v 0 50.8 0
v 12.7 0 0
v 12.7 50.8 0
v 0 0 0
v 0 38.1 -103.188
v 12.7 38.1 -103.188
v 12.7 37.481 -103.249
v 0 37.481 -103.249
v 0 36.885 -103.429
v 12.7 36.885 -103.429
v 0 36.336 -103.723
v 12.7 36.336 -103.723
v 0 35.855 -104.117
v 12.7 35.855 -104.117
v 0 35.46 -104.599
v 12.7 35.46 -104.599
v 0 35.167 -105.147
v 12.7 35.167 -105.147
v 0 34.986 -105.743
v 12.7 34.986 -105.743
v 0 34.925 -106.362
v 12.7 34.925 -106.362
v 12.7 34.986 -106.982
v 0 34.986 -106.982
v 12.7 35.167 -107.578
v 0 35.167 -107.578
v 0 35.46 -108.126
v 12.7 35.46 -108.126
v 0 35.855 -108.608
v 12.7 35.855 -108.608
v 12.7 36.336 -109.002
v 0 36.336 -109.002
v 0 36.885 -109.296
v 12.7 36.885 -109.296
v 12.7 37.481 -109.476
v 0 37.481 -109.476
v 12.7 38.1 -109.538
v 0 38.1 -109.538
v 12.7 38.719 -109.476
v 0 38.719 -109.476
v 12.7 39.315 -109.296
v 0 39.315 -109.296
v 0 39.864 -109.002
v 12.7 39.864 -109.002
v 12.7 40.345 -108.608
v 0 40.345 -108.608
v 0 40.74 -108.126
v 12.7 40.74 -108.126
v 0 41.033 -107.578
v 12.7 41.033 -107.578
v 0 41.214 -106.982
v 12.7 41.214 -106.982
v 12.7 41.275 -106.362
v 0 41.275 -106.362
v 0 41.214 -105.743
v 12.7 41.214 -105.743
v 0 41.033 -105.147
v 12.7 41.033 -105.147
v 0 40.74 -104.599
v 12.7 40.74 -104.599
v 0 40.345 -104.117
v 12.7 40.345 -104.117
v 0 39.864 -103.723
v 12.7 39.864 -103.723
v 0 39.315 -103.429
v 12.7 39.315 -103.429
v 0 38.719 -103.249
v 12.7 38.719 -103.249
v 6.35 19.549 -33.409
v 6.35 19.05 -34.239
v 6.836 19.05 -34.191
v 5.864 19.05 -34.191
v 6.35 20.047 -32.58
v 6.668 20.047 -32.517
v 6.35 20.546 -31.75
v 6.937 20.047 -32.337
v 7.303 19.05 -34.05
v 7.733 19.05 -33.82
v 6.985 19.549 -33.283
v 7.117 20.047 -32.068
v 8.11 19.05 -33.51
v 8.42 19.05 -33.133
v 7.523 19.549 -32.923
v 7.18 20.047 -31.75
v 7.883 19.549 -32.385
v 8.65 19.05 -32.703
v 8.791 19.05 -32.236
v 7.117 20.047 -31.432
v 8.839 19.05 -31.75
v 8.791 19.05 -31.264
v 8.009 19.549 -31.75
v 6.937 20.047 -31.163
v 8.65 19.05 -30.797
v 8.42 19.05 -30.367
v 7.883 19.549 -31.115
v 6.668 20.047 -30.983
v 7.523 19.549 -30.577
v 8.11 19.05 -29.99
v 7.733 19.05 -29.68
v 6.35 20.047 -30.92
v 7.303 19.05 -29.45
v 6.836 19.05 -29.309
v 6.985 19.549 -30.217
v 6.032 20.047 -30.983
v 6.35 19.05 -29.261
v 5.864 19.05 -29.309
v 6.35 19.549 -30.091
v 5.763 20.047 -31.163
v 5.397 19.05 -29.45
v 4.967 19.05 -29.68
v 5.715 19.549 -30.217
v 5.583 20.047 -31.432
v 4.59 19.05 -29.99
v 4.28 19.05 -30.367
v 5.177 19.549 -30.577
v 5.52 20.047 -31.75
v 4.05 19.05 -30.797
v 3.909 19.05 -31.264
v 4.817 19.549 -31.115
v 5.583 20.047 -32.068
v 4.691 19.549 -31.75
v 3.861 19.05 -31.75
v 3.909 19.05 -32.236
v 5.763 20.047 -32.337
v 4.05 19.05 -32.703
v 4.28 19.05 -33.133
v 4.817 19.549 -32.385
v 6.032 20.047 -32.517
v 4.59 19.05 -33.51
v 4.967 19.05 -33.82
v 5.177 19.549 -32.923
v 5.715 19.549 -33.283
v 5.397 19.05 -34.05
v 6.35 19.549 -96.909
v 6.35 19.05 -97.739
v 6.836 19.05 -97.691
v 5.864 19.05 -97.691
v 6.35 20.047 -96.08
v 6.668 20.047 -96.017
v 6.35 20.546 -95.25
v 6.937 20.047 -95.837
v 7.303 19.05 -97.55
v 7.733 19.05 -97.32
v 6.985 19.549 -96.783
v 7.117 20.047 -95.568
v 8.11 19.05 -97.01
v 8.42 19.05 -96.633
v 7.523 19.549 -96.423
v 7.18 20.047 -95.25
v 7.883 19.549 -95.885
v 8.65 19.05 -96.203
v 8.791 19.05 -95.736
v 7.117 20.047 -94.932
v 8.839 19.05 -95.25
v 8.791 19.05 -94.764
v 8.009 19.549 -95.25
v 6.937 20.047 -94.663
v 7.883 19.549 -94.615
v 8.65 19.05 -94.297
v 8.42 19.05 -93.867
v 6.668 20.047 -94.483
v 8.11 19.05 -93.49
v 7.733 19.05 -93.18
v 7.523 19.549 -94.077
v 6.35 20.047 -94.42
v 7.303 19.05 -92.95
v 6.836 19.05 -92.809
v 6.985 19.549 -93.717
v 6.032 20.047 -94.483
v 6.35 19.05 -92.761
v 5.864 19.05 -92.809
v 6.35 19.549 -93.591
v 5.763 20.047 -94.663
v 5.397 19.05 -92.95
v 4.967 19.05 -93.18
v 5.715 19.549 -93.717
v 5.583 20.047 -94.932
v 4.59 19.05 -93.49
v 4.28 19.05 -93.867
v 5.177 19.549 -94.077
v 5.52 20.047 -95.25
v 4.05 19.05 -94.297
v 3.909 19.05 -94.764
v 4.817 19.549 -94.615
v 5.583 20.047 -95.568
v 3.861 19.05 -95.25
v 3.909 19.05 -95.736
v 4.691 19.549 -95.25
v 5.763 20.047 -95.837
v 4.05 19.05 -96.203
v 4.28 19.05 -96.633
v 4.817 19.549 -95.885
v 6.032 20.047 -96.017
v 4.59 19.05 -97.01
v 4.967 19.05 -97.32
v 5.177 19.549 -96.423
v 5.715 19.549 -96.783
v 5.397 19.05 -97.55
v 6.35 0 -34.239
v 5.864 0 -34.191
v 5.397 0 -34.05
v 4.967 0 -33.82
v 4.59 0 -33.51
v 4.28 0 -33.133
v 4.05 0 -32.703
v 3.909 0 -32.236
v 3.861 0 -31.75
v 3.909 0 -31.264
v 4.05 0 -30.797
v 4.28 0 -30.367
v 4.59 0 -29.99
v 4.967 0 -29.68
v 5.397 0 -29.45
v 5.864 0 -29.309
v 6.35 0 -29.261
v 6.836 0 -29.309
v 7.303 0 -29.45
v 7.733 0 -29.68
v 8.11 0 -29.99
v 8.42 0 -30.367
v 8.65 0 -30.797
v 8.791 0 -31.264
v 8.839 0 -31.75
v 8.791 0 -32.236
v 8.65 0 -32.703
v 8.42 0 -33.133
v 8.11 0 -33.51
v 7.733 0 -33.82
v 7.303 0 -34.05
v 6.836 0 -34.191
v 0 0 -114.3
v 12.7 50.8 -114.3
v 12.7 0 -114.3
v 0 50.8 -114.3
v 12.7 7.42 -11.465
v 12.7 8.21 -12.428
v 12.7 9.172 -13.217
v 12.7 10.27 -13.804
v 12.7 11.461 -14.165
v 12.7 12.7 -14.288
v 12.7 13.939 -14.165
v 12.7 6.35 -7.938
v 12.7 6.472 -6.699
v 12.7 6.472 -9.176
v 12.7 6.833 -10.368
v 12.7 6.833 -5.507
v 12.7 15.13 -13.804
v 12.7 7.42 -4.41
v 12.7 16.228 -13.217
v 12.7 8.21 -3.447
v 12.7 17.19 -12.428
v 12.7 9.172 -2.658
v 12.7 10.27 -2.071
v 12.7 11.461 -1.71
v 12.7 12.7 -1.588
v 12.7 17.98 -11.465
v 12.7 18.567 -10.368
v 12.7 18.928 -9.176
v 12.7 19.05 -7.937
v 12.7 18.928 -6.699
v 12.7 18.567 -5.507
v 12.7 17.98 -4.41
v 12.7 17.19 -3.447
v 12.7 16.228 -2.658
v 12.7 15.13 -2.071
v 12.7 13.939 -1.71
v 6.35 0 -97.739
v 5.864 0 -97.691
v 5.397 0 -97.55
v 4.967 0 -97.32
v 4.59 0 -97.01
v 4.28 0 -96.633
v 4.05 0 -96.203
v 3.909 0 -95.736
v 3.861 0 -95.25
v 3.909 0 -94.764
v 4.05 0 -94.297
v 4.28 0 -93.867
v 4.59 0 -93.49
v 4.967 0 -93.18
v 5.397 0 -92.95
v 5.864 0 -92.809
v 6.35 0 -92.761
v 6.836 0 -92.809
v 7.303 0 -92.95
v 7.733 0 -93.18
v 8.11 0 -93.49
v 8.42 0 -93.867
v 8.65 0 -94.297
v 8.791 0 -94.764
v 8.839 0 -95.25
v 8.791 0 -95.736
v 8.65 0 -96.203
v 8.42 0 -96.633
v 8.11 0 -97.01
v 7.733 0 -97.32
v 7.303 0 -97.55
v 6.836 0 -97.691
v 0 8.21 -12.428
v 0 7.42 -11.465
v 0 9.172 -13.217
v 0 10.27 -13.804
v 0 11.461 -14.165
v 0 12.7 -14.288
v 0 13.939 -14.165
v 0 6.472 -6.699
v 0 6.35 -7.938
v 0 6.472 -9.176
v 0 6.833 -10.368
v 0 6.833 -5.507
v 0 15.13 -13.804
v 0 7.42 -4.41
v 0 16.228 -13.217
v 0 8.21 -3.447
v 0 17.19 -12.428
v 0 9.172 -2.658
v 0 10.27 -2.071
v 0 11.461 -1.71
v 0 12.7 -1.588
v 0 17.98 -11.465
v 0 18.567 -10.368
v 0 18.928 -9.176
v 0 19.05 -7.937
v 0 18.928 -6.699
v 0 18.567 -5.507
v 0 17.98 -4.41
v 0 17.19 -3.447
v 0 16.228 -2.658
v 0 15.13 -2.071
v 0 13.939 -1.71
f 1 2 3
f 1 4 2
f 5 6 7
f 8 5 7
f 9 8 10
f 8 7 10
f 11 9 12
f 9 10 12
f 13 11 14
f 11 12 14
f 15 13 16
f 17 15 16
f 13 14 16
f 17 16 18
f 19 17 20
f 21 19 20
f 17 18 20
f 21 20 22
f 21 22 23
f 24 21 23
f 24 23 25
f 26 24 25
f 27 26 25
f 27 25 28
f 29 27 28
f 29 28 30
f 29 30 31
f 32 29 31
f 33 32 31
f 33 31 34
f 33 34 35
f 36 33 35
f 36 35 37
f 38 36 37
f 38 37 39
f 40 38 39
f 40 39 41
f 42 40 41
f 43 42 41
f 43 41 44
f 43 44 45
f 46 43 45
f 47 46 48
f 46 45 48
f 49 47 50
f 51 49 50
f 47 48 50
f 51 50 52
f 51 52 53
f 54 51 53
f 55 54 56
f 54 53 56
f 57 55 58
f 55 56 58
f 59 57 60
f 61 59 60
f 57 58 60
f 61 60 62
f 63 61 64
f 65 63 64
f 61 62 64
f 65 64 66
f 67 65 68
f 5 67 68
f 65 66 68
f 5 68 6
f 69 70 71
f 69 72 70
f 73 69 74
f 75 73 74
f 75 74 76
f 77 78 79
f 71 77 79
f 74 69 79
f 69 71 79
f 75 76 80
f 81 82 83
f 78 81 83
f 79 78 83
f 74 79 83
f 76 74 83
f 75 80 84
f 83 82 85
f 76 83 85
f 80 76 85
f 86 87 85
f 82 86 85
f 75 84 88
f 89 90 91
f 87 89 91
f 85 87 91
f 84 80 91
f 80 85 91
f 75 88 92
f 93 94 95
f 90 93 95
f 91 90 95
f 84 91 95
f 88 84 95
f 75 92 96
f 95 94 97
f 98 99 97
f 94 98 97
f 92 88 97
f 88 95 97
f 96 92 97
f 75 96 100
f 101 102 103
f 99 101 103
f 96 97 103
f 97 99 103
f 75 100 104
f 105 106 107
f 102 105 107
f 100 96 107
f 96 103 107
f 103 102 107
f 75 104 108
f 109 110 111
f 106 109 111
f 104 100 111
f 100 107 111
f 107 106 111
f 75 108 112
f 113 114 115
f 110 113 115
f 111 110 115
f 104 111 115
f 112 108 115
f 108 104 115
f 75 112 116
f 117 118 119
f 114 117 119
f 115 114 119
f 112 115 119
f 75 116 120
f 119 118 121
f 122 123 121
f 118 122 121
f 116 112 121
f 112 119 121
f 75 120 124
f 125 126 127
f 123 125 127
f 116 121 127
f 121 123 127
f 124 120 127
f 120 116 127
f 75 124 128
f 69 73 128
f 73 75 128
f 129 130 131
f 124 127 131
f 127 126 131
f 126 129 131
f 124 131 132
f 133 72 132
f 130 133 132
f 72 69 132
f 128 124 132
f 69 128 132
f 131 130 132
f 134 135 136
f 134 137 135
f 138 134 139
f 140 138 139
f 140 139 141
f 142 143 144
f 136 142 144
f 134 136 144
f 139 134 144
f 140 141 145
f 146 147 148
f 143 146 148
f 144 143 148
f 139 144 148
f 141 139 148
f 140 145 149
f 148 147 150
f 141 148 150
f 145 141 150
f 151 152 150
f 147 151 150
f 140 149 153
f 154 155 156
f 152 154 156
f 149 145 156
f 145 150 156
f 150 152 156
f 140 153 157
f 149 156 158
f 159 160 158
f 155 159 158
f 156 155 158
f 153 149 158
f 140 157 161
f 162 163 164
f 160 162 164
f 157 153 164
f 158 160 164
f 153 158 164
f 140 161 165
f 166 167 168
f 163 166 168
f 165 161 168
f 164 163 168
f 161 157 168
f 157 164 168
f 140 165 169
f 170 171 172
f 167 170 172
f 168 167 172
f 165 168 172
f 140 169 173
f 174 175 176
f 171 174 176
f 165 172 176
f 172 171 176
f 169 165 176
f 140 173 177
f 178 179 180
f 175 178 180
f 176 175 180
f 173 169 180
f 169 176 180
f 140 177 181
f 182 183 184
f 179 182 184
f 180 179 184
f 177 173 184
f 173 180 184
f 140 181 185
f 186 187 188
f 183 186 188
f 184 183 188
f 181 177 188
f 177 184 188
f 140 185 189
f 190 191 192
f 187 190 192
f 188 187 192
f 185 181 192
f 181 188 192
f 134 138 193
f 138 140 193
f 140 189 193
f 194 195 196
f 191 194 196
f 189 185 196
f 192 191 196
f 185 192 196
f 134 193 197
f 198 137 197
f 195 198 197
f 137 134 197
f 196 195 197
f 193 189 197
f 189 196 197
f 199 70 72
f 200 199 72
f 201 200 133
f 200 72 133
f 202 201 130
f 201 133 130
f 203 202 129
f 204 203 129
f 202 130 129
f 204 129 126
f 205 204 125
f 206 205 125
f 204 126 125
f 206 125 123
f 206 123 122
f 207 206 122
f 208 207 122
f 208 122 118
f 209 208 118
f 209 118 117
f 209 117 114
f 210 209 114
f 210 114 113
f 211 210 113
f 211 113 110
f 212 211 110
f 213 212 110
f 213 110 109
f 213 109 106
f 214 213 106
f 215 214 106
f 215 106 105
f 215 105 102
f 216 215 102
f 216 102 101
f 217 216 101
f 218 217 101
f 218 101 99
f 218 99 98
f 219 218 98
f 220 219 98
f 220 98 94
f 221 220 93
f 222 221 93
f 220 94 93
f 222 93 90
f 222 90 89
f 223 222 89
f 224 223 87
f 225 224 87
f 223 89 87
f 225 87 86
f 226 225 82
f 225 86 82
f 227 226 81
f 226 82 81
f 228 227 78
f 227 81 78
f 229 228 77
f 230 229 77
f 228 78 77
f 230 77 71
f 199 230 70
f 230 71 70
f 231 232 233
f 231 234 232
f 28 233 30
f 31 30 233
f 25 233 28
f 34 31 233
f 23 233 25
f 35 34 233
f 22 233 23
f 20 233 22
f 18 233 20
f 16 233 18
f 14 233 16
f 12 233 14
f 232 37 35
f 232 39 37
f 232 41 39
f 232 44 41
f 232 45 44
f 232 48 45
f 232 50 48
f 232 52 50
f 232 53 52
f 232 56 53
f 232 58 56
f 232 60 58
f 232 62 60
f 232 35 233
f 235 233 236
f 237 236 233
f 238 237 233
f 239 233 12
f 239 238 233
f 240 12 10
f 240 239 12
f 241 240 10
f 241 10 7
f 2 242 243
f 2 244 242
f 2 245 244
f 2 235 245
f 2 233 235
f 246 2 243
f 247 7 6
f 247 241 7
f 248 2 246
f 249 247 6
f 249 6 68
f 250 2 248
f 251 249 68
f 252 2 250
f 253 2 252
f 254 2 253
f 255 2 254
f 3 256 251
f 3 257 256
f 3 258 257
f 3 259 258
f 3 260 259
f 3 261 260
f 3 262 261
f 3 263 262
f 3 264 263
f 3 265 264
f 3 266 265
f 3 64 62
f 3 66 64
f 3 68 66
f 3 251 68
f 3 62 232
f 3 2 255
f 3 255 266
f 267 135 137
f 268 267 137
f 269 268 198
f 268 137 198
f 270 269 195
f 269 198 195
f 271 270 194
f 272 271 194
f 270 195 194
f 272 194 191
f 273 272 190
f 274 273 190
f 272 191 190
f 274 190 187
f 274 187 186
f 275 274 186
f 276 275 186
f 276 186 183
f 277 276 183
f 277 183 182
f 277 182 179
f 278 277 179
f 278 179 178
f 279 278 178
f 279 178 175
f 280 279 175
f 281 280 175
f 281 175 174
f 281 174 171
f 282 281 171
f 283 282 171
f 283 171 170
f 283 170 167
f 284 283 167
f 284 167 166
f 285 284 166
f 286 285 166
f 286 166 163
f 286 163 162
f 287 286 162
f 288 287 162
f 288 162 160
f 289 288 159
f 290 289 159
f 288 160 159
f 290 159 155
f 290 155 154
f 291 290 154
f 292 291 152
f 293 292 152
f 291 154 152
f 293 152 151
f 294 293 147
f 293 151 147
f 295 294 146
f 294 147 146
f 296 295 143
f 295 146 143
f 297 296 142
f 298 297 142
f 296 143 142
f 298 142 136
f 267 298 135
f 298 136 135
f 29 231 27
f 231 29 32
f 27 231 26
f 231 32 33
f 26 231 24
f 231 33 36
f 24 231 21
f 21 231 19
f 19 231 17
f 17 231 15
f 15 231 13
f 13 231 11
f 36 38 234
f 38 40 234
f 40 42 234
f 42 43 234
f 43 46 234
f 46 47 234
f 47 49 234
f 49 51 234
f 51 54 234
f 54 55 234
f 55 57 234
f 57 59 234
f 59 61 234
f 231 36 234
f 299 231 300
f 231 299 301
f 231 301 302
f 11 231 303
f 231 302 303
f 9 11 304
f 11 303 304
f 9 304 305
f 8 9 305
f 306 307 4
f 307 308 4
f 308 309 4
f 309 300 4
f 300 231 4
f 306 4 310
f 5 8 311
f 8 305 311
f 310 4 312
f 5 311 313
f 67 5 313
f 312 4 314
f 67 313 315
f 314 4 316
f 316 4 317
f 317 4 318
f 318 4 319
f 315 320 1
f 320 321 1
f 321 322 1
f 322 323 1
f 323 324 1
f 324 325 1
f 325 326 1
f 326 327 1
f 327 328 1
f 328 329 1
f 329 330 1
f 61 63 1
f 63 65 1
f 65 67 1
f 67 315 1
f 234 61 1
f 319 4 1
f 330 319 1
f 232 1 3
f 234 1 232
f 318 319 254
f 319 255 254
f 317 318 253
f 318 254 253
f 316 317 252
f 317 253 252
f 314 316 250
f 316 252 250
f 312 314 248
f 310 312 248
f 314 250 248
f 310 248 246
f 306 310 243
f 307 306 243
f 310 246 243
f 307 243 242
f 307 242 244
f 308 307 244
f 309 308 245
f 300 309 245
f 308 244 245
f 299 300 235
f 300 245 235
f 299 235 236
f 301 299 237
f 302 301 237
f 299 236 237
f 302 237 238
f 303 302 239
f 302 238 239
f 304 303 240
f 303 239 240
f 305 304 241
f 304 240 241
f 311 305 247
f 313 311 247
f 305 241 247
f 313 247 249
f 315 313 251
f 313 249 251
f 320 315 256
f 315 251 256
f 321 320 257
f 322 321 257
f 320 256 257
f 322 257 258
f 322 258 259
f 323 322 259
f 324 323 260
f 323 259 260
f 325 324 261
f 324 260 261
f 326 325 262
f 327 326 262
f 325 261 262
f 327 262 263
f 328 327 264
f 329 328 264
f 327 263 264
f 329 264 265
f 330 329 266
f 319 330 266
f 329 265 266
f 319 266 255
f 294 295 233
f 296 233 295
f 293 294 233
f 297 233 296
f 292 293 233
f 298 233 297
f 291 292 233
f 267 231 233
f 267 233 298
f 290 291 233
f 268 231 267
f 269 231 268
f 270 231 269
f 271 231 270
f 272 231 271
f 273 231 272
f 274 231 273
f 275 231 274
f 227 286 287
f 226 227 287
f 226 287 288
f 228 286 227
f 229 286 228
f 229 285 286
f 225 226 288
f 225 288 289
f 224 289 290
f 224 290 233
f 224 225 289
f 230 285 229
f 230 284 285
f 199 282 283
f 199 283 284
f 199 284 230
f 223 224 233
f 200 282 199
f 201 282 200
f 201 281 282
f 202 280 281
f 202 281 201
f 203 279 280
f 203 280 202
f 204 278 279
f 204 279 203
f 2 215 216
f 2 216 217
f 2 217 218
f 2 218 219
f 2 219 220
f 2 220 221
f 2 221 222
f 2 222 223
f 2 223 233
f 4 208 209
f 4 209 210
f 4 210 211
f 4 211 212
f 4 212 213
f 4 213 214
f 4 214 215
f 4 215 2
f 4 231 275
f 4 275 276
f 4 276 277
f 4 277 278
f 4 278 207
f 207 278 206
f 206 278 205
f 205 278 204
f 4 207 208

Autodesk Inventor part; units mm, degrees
ref_plane "YZ Plane" through (0, 0, 0) normal (1, 0, 0) x (0, 1, 0)
ref_plane "XZ Plane" through (0, 0, 0) normal (0, 1, 0) x (-1, 0, 0)
ref_plane "XY Plane" through (0, 0, 0) normal (0, 0, 1) x (1, 0, 0)
sketch "Sketch2" plane through (0, 0, 0) normal (1, 0, 0) x (0, 1, 0)
  line L0 (0, 0) -> (50.8, 0)
  line L1 (50.8, 0) -> (50.8, -114.3)
  line L2 (50.8, -114.3) -> (0, -114.3)
  line L3 (0, -114.3) -> (0, 0)
  circle A0 centre (12.7, -7.9375) radius 6.35
  point P0 (38.1, -106.3625)
  dimension "d0" = 50.8
  dimension "d1" = 114.3
  dimension "d2" = 98.425
  dimension "d3" = 25.4
  dimension "d4" = 12.7
  dimension "d5" = 7.9375
  dimension "d15" = 12.7
extrude "Extrusion1" add sketch "Sketch2" along normal blind 12.7 contours L0 L1 L2 L3 | A0
hole "Hole1" at (0, 38.1, -106.3625) direction (1, 0, 0) diameter 6.35 depth 19.05 tip angle 118
hole "Hole2" at (0, 12.7, -7.9375) direction (1, 0, 0) diameter 12.7 depth 19.05 tip angle 118
sketch "Sketch3" plane through (0, 0, -114.3) normal (0, -1, 0) x (1, 0, 0)
  line L0 (0, 114.3) -> (0, 0) projected
  line L1 (0, 0) -> (12.7, 0) projected
  line L2 (12.7, 114.3) -> (12.7, 0) projected
  line L3 (0, 114.3) -> (12.7, 114.3) projected
  line L4 (0, 114.3) -> (0, 0) projected
  line L5 (0, 0) -> (12.7, 0) projected
  line L6 (12.7, 114.3) -> (12.7, 0) projected
  line L7 (0, 114.3) -> (12.7, 114.3) projected
  point P0 (6.35, 82.55)
  point P1 (6.35, 19.05)
  dimension "d23" = 63.5
  dimension "d24" = 19.05
hole "Hole3" at (6.35, 0, -31.75) at (6.35, 0, -95.25) direction (0, 1, 0) diameter 4.9784 depth 19.05 tip angle 118 thread size "1/4-20 UNC" class "2B" standard "ANSI Unified Screw Threads"
equation "\"d4\" = -0.5 * d3 + 0.5 * d0"
equation "\"d5\" = -0.5 * d2 + 0.5 * d1"
properties part number "clolecton wheel holder"
